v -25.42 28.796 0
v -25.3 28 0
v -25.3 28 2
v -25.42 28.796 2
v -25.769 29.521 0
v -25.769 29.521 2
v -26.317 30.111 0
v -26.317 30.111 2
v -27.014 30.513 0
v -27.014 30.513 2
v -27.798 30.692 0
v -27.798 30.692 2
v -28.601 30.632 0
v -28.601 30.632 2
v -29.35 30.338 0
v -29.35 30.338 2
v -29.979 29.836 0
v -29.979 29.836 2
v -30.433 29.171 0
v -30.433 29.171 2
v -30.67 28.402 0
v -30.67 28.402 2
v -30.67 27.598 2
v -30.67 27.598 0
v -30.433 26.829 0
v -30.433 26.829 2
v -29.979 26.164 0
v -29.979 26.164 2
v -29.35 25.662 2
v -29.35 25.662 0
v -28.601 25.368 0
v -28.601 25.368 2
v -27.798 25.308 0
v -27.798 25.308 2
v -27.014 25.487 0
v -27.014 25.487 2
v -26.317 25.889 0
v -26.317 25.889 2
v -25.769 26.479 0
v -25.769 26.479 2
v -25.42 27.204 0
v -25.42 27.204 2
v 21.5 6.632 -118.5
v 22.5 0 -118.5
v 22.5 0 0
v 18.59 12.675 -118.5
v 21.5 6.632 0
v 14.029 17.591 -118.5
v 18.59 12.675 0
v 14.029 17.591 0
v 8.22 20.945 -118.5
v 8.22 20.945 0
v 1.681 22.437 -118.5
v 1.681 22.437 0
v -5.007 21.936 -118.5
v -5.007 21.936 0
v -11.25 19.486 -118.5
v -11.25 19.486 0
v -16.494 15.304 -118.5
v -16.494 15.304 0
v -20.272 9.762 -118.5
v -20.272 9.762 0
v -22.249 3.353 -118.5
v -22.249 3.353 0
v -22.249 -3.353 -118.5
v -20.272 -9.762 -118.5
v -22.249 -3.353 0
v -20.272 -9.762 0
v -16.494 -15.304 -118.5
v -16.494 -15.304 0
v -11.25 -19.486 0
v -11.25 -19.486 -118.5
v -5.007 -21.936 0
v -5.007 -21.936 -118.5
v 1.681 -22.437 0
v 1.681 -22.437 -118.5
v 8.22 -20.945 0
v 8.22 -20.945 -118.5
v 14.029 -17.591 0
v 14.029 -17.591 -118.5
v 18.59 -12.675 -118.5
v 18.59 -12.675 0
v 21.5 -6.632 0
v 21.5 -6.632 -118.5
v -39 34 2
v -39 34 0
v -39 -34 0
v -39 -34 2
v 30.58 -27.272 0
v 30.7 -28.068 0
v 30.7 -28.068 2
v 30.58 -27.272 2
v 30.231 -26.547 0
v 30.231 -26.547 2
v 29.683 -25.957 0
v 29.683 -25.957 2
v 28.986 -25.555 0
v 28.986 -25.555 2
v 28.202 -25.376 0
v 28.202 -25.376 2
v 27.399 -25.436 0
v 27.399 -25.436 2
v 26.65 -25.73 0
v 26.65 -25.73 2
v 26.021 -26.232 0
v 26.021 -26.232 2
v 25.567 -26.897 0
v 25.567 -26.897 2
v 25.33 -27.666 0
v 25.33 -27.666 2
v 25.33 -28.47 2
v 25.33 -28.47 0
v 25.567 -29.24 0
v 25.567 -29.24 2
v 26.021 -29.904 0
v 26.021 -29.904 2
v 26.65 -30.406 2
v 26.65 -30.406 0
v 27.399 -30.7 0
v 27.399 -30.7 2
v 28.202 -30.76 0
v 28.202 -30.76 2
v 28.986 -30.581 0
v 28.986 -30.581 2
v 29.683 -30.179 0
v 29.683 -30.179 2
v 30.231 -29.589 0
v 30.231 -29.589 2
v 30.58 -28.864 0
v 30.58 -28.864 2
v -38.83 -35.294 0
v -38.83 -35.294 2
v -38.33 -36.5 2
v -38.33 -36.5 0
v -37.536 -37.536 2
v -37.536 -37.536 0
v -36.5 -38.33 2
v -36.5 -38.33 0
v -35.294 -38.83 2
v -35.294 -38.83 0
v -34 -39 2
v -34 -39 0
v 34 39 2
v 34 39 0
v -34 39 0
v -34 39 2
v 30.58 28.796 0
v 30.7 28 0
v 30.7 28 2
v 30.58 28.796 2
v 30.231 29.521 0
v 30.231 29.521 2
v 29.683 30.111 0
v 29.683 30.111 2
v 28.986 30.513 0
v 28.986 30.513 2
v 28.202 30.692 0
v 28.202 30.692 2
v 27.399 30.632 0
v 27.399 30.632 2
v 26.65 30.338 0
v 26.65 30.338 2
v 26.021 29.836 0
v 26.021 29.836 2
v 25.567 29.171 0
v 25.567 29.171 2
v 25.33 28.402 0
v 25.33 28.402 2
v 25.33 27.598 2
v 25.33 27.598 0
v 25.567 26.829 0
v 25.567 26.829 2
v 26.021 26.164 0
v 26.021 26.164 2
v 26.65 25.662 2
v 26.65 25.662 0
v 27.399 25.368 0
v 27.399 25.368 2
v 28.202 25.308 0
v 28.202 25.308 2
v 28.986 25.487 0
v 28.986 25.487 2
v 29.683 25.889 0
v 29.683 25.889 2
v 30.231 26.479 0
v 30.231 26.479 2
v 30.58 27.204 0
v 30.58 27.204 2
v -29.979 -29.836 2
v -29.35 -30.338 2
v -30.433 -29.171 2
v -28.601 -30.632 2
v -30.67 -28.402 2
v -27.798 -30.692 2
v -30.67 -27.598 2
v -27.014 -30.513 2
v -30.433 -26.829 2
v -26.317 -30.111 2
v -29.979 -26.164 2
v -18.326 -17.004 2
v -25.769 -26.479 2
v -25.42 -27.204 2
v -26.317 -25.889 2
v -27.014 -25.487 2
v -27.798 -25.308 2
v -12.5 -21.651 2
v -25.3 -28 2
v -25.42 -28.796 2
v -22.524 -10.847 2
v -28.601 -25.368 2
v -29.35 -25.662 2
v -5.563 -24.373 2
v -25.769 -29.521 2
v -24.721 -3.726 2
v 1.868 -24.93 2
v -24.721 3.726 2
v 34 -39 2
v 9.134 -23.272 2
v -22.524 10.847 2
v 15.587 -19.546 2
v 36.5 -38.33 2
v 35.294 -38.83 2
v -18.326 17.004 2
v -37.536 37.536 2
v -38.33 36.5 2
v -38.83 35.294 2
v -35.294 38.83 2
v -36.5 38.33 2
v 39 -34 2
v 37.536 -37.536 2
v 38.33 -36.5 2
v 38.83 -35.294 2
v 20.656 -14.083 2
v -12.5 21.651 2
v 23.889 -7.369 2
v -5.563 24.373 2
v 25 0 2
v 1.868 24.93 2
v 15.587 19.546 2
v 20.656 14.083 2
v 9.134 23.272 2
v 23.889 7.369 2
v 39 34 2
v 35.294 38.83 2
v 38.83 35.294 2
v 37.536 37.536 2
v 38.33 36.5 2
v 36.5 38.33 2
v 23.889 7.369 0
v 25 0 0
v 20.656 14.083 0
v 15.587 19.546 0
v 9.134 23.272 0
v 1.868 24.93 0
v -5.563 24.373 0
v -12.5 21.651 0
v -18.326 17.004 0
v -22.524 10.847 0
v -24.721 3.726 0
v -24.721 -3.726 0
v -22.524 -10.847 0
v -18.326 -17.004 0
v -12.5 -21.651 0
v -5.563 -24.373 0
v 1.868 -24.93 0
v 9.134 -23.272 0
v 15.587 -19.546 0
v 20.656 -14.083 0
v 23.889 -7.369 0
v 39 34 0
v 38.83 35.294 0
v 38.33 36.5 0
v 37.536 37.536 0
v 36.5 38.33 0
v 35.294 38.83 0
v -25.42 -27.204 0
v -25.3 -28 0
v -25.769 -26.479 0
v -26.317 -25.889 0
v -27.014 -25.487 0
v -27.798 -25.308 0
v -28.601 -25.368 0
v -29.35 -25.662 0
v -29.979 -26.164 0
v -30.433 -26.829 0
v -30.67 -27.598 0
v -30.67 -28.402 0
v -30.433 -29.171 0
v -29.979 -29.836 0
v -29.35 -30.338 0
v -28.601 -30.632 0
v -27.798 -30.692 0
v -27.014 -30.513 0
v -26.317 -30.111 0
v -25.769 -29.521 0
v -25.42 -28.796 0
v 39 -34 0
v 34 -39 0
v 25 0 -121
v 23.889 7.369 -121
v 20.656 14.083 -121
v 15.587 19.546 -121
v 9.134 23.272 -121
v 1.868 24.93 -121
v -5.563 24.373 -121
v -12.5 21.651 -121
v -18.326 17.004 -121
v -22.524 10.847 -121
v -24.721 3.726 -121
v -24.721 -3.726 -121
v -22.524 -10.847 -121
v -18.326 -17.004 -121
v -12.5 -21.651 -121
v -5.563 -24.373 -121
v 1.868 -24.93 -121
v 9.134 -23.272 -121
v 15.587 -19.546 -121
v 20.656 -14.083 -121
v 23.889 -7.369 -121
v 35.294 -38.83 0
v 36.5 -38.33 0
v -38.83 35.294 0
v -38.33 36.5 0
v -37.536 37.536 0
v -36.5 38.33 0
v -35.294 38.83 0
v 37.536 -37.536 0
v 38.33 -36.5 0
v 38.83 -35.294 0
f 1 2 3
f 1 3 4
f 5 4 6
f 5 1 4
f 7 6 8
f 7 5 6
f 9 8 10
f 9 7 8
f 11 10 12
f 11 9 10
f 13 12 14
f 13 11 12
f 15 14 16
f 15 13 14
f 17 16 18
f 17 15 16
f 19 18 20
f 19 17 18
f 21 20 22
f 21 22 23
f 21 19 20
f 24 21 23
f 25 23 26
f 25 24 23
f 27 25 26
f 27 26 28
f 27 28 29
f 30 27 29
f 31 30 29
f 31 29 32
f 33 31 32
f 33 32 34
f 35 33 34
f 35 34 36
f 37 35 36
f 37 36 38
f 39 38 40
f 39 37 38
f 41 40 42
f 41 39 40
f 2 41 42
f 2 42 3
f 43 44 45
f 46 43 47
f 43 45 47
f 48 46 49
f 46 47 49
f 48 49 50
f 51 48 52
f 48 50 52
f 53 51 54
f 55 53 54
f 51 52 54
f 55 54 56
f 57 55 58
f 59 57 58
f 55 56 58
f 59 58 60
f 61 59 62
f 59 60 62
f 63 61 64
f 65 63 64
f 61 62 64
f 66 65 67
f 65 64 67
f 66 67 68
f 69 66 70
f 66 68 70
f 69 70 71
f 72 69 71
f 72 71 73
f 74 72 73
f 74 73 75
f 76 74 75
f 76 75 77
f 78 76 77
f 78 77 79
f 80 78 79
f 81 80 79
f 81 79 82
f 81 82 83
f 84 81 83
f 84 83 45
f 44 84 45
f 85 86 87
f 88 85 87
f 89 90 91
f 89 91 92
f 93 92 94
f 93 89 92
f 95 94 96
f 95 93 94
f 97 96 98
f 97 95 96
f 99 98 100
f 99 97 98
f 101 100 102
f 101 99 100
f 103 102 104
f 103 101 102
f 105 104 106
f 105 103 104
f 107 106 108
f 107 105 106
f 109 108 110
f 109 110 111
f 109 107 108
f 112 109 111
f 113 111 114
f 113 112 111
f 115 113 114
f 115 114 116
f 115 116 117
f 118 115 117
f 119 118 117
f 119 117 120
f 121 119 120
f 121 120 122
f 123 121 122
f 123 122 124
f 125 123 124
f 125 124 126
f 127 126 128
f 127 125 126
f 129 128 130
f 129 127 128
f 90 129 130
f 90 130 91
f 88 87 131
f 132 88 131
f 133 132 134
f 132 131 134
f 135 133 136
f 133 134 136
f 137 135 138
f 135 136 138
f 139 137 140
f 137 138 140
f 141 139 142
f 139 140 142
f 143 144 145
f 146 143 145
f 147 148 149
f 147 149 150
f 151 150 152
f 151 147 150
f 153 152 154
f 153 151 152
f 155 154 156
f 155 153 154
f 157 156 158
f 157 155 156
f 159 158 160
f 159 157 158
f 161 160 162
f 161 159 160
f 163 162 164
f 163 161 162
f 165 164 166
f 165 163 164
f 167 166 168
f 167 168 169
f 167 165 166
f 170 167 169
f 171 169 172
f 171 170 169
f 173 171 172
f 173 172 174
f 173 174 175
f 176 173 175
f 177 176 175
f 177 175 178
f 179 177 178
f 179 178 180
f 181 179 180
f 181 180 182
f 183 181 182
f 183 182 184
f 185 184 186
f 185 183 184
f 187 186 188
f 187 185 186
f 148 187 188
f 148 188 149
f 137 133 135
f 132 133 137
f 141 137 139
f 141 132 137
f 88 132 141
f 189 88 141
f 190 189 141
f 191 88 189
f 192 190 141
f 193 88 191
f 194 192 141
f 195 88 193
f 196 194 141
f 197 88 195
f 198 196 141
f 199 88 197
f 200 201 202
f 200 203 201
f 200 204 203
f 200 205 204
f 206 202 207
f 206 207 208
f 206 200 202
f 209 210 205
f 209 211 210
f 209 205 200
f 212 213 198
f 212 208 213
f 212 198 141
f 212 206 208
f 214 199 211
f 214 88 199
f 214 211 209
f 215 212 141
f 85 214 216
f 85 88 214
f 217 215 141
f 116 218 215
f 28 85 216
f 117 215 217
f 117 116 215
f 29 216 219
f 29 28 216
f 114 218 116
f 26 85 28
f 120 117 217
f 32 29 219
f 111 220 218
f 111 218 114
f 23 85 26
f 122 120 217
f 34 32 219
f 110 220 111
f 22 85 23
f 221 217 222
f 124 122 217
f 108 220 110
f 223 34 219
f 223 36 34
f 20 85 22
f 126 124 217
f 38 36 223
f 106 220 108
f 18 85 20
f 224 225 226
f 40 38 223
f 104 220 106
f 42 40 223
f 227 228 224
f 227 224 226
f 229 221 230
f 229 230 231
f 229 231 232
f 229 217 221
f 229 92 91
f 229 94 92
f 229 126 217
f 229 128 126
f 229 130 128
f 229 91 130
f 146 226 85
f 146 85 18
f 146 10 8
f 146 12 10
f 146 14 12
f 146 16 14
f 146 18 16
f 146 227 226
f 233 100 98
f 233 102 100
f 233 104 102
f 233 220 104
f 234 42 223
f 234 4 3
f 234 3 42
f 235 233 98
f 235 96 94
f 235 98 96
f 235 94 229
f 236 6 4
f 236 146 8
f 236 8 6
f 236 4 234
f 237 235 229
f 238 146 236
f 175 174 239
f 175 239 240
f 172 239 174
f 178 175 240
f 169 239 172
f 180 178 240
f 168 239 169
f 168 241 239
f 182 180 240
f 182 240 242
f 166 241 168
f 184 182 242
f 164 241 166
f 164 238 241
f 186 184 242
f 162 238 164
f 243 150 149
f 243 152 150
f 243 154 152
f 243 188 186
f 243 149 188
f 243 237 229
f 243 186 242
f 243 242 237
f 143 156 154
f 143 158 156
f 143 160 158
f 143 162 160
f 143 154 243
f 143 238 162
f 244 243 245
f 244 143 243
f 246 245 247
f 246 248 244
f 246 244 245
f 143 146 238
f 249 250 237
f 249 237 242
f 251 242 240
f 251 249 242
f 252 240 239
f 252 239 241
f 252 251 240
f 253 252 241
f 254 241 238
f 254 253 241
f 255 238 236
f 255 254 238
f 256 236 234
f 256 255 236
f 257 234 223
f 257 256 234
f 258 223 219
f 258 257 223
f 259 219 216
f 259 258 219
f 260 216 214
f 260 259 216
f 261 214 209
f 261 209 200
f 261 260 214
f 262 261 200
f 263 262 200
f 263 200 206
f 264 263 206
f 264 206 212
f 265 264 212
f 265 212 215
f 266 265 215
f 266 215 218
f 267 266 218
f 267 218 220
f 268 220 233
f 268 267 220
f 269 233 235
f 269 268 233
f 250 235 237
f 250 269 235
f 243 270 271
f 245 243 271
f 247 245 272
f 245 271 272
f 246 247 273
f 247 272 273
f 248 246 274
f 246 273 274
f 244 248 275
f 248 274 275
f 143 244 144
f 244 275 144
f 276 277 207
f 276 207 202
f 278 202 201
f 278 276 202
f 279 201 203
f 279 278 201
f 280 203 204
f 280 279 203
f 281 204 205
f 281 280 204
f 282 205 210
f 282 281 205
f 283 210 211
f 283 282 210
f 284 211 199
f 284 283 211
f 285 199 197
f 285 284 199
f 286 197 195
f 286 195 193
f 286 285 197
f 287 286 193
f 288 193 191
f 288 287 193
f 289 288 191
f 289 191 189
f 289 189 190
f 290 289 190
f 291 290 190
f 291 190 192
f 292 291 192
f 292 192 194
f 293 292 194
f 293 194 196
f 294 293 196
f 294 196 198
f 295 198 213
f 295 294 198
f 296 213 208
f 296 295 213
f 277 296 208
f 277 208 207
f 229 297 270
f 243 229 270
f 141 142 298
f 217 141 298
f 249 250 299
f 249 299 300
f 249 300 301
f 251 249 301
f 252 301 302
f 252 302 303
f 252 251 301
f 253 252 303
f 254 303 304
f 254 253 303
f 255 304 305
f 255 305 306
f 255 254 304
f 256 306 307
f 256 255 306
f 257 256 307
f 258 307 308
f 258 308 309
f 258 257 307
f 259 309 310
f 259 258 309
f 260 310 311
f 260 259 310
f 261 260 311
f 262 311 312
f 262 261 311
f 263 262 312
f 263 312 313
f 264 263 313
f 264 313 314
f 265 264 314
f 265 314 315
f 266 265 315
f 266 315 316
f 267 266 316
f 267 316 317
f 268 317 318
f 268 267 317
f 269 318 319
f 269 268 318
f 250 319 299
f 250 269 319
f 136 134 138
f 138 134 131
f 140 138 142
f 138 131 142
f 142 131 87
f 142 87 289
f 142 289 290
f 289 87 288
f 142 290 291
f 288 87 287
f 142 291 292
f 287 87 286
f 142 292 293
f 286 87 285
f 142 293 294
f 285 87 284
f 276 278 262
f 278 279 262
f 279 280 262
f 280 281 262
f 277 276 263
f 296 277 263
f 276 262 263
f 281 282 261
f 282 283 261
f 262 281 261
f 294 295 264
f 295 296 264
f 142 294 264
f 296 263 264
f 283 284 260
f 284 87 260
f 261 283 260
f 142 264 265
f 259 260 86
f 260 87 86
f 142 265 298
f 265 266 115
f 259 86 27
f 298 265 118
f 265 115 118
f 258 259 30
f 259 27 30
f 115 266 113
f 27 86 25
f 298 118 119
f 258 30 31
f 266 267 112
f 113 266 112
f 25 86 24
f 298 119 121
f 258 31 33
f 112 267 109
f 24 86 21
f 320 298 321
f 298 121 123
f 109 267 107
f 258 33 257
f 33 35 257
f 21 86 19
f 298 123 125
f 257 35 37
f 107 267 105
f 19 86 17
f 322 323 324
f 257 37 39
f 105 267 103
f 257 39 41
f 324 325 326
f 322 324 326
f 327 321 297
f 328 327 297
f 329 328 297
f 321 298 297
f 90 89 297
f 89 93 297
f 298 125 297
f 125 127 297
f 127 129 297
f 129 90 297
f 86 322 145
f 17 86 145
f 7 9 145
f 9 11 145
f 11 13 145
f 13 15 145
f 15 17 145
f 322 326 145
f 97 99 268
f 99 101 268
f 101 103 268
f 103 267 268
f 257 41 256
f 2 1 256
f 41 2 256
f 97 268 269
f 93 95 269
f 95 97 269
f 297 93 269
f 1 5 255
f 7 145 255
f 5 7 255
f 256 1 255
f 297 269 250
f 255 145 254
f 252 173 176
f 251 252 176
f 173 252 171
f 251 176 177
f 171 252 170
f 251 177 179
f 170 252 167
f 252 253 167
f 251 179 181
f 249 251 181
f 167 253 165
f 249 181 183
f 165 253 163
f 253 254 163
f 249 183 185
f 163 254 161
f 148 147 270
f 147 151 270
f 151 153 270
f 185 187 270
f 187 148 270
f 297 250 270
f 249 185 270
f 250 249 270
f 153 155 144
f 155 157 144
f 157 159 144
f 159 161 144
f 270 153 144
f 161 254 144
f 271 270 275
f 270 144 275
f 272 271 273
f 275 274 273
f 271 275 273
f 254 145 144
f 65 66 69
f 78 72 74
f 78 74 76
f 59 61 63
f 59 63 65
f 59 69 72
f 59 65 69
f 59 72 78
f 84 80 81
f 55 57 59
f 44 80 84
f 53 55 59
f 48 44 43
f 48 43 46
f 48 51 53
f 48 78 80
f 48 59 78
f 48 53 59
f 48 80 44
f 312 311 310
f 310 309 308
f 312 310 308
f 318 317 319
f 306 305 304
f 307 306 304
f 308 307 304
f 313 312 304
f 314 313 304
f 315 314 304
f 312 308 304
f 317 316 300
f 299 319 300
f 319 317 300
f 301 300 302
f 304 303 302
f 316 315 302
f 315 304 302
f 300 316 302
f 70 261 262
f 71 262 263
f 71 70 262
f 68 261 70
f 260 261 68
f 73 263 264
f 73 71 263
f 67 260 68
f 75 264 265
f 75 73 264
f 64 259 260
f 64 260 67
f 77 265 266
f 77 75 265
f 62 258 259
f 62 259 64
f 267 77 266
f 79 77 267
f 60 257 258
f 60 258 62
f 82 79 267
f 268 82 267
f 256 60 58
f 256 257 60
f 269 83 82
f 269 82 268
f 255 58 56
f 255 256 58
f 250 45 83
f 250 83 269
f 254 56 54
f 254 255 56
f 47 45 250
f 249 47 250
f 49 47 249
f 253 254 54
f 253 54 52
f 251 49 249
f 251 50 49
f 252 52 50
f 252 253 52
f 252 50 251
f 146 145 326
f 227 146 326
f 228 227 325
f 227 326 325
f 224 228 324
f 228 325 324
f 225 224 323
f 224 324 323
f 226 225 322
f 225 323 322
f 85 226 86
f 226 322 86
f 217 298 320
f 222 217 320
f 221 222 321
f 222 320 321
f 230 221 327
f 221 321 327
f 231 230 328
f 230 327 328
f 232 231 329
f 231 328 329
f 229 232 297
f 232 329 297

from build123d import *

# Parameters (mm, degrees)
F0_R     = 25
F1_DEPTH = 121
F2_T     = -2.5
F3_R     = 2.7
F3_R_2   = 25
F4_DEPTH = 2


with BuildPart() as f1:
    # F0 (on Top) → F1 (new body)
    with BuildSketch(Plane.XY):
        Circle(F0_R)
    extrude(amount=-F1_DEPTH)

    # F2
    f2_openings = [f1.faces().sort_by_distance(p)[0] for p in [
        (0, 0, 0),
    ]]
    offset(amount=F2_T, openings=f2_openings)


with BuildPart() as f4:
    # F3 (on face) → F4 (new body)
    with BuildSketch(Plane.XY):
        with BuildLine():
            Line((-34, -39), (34, -39))
            ThreePointArc((34, -39), (37.5355339059, -37.5355339059), (39, -34))
            Line((39, -34), (39, 34))
            ThreePointArc((39, 34), (37.5355339059, 37.5355339059), (34, 39))
            Line((34, 39), (-34, 39))
            ThreePointArc((-34, 39), (-37.5355339059, 37.5355339059), (-39, 34))
            Line((-39, 34), (-39, -34))
            ThreePointArc((-39, -34), (-37.5355339059, -37.5355339059), (-34, -39))
        make_face()
        with Locations((-28, -28)):
            Circle(F3_R, mode=Mode.SUBTRACT)
        with Locations((28, -28.0680302531)):
            Circle(F3_R, mode=Mode.SUBTRACT)
        with Locations((-28, 28)):
            Circle(F3_R, mode=Mode.SUBTRACT)
        Circle(F3_R_2, mode=Mode.SUBTRACT)
        with Locations((28, 28)):
            Circle(F3_R, mode=Mode.SUBTRACT)
    extrude(amount=F4_DEPTH)


solid = Compound([f1.part, f4.part])
